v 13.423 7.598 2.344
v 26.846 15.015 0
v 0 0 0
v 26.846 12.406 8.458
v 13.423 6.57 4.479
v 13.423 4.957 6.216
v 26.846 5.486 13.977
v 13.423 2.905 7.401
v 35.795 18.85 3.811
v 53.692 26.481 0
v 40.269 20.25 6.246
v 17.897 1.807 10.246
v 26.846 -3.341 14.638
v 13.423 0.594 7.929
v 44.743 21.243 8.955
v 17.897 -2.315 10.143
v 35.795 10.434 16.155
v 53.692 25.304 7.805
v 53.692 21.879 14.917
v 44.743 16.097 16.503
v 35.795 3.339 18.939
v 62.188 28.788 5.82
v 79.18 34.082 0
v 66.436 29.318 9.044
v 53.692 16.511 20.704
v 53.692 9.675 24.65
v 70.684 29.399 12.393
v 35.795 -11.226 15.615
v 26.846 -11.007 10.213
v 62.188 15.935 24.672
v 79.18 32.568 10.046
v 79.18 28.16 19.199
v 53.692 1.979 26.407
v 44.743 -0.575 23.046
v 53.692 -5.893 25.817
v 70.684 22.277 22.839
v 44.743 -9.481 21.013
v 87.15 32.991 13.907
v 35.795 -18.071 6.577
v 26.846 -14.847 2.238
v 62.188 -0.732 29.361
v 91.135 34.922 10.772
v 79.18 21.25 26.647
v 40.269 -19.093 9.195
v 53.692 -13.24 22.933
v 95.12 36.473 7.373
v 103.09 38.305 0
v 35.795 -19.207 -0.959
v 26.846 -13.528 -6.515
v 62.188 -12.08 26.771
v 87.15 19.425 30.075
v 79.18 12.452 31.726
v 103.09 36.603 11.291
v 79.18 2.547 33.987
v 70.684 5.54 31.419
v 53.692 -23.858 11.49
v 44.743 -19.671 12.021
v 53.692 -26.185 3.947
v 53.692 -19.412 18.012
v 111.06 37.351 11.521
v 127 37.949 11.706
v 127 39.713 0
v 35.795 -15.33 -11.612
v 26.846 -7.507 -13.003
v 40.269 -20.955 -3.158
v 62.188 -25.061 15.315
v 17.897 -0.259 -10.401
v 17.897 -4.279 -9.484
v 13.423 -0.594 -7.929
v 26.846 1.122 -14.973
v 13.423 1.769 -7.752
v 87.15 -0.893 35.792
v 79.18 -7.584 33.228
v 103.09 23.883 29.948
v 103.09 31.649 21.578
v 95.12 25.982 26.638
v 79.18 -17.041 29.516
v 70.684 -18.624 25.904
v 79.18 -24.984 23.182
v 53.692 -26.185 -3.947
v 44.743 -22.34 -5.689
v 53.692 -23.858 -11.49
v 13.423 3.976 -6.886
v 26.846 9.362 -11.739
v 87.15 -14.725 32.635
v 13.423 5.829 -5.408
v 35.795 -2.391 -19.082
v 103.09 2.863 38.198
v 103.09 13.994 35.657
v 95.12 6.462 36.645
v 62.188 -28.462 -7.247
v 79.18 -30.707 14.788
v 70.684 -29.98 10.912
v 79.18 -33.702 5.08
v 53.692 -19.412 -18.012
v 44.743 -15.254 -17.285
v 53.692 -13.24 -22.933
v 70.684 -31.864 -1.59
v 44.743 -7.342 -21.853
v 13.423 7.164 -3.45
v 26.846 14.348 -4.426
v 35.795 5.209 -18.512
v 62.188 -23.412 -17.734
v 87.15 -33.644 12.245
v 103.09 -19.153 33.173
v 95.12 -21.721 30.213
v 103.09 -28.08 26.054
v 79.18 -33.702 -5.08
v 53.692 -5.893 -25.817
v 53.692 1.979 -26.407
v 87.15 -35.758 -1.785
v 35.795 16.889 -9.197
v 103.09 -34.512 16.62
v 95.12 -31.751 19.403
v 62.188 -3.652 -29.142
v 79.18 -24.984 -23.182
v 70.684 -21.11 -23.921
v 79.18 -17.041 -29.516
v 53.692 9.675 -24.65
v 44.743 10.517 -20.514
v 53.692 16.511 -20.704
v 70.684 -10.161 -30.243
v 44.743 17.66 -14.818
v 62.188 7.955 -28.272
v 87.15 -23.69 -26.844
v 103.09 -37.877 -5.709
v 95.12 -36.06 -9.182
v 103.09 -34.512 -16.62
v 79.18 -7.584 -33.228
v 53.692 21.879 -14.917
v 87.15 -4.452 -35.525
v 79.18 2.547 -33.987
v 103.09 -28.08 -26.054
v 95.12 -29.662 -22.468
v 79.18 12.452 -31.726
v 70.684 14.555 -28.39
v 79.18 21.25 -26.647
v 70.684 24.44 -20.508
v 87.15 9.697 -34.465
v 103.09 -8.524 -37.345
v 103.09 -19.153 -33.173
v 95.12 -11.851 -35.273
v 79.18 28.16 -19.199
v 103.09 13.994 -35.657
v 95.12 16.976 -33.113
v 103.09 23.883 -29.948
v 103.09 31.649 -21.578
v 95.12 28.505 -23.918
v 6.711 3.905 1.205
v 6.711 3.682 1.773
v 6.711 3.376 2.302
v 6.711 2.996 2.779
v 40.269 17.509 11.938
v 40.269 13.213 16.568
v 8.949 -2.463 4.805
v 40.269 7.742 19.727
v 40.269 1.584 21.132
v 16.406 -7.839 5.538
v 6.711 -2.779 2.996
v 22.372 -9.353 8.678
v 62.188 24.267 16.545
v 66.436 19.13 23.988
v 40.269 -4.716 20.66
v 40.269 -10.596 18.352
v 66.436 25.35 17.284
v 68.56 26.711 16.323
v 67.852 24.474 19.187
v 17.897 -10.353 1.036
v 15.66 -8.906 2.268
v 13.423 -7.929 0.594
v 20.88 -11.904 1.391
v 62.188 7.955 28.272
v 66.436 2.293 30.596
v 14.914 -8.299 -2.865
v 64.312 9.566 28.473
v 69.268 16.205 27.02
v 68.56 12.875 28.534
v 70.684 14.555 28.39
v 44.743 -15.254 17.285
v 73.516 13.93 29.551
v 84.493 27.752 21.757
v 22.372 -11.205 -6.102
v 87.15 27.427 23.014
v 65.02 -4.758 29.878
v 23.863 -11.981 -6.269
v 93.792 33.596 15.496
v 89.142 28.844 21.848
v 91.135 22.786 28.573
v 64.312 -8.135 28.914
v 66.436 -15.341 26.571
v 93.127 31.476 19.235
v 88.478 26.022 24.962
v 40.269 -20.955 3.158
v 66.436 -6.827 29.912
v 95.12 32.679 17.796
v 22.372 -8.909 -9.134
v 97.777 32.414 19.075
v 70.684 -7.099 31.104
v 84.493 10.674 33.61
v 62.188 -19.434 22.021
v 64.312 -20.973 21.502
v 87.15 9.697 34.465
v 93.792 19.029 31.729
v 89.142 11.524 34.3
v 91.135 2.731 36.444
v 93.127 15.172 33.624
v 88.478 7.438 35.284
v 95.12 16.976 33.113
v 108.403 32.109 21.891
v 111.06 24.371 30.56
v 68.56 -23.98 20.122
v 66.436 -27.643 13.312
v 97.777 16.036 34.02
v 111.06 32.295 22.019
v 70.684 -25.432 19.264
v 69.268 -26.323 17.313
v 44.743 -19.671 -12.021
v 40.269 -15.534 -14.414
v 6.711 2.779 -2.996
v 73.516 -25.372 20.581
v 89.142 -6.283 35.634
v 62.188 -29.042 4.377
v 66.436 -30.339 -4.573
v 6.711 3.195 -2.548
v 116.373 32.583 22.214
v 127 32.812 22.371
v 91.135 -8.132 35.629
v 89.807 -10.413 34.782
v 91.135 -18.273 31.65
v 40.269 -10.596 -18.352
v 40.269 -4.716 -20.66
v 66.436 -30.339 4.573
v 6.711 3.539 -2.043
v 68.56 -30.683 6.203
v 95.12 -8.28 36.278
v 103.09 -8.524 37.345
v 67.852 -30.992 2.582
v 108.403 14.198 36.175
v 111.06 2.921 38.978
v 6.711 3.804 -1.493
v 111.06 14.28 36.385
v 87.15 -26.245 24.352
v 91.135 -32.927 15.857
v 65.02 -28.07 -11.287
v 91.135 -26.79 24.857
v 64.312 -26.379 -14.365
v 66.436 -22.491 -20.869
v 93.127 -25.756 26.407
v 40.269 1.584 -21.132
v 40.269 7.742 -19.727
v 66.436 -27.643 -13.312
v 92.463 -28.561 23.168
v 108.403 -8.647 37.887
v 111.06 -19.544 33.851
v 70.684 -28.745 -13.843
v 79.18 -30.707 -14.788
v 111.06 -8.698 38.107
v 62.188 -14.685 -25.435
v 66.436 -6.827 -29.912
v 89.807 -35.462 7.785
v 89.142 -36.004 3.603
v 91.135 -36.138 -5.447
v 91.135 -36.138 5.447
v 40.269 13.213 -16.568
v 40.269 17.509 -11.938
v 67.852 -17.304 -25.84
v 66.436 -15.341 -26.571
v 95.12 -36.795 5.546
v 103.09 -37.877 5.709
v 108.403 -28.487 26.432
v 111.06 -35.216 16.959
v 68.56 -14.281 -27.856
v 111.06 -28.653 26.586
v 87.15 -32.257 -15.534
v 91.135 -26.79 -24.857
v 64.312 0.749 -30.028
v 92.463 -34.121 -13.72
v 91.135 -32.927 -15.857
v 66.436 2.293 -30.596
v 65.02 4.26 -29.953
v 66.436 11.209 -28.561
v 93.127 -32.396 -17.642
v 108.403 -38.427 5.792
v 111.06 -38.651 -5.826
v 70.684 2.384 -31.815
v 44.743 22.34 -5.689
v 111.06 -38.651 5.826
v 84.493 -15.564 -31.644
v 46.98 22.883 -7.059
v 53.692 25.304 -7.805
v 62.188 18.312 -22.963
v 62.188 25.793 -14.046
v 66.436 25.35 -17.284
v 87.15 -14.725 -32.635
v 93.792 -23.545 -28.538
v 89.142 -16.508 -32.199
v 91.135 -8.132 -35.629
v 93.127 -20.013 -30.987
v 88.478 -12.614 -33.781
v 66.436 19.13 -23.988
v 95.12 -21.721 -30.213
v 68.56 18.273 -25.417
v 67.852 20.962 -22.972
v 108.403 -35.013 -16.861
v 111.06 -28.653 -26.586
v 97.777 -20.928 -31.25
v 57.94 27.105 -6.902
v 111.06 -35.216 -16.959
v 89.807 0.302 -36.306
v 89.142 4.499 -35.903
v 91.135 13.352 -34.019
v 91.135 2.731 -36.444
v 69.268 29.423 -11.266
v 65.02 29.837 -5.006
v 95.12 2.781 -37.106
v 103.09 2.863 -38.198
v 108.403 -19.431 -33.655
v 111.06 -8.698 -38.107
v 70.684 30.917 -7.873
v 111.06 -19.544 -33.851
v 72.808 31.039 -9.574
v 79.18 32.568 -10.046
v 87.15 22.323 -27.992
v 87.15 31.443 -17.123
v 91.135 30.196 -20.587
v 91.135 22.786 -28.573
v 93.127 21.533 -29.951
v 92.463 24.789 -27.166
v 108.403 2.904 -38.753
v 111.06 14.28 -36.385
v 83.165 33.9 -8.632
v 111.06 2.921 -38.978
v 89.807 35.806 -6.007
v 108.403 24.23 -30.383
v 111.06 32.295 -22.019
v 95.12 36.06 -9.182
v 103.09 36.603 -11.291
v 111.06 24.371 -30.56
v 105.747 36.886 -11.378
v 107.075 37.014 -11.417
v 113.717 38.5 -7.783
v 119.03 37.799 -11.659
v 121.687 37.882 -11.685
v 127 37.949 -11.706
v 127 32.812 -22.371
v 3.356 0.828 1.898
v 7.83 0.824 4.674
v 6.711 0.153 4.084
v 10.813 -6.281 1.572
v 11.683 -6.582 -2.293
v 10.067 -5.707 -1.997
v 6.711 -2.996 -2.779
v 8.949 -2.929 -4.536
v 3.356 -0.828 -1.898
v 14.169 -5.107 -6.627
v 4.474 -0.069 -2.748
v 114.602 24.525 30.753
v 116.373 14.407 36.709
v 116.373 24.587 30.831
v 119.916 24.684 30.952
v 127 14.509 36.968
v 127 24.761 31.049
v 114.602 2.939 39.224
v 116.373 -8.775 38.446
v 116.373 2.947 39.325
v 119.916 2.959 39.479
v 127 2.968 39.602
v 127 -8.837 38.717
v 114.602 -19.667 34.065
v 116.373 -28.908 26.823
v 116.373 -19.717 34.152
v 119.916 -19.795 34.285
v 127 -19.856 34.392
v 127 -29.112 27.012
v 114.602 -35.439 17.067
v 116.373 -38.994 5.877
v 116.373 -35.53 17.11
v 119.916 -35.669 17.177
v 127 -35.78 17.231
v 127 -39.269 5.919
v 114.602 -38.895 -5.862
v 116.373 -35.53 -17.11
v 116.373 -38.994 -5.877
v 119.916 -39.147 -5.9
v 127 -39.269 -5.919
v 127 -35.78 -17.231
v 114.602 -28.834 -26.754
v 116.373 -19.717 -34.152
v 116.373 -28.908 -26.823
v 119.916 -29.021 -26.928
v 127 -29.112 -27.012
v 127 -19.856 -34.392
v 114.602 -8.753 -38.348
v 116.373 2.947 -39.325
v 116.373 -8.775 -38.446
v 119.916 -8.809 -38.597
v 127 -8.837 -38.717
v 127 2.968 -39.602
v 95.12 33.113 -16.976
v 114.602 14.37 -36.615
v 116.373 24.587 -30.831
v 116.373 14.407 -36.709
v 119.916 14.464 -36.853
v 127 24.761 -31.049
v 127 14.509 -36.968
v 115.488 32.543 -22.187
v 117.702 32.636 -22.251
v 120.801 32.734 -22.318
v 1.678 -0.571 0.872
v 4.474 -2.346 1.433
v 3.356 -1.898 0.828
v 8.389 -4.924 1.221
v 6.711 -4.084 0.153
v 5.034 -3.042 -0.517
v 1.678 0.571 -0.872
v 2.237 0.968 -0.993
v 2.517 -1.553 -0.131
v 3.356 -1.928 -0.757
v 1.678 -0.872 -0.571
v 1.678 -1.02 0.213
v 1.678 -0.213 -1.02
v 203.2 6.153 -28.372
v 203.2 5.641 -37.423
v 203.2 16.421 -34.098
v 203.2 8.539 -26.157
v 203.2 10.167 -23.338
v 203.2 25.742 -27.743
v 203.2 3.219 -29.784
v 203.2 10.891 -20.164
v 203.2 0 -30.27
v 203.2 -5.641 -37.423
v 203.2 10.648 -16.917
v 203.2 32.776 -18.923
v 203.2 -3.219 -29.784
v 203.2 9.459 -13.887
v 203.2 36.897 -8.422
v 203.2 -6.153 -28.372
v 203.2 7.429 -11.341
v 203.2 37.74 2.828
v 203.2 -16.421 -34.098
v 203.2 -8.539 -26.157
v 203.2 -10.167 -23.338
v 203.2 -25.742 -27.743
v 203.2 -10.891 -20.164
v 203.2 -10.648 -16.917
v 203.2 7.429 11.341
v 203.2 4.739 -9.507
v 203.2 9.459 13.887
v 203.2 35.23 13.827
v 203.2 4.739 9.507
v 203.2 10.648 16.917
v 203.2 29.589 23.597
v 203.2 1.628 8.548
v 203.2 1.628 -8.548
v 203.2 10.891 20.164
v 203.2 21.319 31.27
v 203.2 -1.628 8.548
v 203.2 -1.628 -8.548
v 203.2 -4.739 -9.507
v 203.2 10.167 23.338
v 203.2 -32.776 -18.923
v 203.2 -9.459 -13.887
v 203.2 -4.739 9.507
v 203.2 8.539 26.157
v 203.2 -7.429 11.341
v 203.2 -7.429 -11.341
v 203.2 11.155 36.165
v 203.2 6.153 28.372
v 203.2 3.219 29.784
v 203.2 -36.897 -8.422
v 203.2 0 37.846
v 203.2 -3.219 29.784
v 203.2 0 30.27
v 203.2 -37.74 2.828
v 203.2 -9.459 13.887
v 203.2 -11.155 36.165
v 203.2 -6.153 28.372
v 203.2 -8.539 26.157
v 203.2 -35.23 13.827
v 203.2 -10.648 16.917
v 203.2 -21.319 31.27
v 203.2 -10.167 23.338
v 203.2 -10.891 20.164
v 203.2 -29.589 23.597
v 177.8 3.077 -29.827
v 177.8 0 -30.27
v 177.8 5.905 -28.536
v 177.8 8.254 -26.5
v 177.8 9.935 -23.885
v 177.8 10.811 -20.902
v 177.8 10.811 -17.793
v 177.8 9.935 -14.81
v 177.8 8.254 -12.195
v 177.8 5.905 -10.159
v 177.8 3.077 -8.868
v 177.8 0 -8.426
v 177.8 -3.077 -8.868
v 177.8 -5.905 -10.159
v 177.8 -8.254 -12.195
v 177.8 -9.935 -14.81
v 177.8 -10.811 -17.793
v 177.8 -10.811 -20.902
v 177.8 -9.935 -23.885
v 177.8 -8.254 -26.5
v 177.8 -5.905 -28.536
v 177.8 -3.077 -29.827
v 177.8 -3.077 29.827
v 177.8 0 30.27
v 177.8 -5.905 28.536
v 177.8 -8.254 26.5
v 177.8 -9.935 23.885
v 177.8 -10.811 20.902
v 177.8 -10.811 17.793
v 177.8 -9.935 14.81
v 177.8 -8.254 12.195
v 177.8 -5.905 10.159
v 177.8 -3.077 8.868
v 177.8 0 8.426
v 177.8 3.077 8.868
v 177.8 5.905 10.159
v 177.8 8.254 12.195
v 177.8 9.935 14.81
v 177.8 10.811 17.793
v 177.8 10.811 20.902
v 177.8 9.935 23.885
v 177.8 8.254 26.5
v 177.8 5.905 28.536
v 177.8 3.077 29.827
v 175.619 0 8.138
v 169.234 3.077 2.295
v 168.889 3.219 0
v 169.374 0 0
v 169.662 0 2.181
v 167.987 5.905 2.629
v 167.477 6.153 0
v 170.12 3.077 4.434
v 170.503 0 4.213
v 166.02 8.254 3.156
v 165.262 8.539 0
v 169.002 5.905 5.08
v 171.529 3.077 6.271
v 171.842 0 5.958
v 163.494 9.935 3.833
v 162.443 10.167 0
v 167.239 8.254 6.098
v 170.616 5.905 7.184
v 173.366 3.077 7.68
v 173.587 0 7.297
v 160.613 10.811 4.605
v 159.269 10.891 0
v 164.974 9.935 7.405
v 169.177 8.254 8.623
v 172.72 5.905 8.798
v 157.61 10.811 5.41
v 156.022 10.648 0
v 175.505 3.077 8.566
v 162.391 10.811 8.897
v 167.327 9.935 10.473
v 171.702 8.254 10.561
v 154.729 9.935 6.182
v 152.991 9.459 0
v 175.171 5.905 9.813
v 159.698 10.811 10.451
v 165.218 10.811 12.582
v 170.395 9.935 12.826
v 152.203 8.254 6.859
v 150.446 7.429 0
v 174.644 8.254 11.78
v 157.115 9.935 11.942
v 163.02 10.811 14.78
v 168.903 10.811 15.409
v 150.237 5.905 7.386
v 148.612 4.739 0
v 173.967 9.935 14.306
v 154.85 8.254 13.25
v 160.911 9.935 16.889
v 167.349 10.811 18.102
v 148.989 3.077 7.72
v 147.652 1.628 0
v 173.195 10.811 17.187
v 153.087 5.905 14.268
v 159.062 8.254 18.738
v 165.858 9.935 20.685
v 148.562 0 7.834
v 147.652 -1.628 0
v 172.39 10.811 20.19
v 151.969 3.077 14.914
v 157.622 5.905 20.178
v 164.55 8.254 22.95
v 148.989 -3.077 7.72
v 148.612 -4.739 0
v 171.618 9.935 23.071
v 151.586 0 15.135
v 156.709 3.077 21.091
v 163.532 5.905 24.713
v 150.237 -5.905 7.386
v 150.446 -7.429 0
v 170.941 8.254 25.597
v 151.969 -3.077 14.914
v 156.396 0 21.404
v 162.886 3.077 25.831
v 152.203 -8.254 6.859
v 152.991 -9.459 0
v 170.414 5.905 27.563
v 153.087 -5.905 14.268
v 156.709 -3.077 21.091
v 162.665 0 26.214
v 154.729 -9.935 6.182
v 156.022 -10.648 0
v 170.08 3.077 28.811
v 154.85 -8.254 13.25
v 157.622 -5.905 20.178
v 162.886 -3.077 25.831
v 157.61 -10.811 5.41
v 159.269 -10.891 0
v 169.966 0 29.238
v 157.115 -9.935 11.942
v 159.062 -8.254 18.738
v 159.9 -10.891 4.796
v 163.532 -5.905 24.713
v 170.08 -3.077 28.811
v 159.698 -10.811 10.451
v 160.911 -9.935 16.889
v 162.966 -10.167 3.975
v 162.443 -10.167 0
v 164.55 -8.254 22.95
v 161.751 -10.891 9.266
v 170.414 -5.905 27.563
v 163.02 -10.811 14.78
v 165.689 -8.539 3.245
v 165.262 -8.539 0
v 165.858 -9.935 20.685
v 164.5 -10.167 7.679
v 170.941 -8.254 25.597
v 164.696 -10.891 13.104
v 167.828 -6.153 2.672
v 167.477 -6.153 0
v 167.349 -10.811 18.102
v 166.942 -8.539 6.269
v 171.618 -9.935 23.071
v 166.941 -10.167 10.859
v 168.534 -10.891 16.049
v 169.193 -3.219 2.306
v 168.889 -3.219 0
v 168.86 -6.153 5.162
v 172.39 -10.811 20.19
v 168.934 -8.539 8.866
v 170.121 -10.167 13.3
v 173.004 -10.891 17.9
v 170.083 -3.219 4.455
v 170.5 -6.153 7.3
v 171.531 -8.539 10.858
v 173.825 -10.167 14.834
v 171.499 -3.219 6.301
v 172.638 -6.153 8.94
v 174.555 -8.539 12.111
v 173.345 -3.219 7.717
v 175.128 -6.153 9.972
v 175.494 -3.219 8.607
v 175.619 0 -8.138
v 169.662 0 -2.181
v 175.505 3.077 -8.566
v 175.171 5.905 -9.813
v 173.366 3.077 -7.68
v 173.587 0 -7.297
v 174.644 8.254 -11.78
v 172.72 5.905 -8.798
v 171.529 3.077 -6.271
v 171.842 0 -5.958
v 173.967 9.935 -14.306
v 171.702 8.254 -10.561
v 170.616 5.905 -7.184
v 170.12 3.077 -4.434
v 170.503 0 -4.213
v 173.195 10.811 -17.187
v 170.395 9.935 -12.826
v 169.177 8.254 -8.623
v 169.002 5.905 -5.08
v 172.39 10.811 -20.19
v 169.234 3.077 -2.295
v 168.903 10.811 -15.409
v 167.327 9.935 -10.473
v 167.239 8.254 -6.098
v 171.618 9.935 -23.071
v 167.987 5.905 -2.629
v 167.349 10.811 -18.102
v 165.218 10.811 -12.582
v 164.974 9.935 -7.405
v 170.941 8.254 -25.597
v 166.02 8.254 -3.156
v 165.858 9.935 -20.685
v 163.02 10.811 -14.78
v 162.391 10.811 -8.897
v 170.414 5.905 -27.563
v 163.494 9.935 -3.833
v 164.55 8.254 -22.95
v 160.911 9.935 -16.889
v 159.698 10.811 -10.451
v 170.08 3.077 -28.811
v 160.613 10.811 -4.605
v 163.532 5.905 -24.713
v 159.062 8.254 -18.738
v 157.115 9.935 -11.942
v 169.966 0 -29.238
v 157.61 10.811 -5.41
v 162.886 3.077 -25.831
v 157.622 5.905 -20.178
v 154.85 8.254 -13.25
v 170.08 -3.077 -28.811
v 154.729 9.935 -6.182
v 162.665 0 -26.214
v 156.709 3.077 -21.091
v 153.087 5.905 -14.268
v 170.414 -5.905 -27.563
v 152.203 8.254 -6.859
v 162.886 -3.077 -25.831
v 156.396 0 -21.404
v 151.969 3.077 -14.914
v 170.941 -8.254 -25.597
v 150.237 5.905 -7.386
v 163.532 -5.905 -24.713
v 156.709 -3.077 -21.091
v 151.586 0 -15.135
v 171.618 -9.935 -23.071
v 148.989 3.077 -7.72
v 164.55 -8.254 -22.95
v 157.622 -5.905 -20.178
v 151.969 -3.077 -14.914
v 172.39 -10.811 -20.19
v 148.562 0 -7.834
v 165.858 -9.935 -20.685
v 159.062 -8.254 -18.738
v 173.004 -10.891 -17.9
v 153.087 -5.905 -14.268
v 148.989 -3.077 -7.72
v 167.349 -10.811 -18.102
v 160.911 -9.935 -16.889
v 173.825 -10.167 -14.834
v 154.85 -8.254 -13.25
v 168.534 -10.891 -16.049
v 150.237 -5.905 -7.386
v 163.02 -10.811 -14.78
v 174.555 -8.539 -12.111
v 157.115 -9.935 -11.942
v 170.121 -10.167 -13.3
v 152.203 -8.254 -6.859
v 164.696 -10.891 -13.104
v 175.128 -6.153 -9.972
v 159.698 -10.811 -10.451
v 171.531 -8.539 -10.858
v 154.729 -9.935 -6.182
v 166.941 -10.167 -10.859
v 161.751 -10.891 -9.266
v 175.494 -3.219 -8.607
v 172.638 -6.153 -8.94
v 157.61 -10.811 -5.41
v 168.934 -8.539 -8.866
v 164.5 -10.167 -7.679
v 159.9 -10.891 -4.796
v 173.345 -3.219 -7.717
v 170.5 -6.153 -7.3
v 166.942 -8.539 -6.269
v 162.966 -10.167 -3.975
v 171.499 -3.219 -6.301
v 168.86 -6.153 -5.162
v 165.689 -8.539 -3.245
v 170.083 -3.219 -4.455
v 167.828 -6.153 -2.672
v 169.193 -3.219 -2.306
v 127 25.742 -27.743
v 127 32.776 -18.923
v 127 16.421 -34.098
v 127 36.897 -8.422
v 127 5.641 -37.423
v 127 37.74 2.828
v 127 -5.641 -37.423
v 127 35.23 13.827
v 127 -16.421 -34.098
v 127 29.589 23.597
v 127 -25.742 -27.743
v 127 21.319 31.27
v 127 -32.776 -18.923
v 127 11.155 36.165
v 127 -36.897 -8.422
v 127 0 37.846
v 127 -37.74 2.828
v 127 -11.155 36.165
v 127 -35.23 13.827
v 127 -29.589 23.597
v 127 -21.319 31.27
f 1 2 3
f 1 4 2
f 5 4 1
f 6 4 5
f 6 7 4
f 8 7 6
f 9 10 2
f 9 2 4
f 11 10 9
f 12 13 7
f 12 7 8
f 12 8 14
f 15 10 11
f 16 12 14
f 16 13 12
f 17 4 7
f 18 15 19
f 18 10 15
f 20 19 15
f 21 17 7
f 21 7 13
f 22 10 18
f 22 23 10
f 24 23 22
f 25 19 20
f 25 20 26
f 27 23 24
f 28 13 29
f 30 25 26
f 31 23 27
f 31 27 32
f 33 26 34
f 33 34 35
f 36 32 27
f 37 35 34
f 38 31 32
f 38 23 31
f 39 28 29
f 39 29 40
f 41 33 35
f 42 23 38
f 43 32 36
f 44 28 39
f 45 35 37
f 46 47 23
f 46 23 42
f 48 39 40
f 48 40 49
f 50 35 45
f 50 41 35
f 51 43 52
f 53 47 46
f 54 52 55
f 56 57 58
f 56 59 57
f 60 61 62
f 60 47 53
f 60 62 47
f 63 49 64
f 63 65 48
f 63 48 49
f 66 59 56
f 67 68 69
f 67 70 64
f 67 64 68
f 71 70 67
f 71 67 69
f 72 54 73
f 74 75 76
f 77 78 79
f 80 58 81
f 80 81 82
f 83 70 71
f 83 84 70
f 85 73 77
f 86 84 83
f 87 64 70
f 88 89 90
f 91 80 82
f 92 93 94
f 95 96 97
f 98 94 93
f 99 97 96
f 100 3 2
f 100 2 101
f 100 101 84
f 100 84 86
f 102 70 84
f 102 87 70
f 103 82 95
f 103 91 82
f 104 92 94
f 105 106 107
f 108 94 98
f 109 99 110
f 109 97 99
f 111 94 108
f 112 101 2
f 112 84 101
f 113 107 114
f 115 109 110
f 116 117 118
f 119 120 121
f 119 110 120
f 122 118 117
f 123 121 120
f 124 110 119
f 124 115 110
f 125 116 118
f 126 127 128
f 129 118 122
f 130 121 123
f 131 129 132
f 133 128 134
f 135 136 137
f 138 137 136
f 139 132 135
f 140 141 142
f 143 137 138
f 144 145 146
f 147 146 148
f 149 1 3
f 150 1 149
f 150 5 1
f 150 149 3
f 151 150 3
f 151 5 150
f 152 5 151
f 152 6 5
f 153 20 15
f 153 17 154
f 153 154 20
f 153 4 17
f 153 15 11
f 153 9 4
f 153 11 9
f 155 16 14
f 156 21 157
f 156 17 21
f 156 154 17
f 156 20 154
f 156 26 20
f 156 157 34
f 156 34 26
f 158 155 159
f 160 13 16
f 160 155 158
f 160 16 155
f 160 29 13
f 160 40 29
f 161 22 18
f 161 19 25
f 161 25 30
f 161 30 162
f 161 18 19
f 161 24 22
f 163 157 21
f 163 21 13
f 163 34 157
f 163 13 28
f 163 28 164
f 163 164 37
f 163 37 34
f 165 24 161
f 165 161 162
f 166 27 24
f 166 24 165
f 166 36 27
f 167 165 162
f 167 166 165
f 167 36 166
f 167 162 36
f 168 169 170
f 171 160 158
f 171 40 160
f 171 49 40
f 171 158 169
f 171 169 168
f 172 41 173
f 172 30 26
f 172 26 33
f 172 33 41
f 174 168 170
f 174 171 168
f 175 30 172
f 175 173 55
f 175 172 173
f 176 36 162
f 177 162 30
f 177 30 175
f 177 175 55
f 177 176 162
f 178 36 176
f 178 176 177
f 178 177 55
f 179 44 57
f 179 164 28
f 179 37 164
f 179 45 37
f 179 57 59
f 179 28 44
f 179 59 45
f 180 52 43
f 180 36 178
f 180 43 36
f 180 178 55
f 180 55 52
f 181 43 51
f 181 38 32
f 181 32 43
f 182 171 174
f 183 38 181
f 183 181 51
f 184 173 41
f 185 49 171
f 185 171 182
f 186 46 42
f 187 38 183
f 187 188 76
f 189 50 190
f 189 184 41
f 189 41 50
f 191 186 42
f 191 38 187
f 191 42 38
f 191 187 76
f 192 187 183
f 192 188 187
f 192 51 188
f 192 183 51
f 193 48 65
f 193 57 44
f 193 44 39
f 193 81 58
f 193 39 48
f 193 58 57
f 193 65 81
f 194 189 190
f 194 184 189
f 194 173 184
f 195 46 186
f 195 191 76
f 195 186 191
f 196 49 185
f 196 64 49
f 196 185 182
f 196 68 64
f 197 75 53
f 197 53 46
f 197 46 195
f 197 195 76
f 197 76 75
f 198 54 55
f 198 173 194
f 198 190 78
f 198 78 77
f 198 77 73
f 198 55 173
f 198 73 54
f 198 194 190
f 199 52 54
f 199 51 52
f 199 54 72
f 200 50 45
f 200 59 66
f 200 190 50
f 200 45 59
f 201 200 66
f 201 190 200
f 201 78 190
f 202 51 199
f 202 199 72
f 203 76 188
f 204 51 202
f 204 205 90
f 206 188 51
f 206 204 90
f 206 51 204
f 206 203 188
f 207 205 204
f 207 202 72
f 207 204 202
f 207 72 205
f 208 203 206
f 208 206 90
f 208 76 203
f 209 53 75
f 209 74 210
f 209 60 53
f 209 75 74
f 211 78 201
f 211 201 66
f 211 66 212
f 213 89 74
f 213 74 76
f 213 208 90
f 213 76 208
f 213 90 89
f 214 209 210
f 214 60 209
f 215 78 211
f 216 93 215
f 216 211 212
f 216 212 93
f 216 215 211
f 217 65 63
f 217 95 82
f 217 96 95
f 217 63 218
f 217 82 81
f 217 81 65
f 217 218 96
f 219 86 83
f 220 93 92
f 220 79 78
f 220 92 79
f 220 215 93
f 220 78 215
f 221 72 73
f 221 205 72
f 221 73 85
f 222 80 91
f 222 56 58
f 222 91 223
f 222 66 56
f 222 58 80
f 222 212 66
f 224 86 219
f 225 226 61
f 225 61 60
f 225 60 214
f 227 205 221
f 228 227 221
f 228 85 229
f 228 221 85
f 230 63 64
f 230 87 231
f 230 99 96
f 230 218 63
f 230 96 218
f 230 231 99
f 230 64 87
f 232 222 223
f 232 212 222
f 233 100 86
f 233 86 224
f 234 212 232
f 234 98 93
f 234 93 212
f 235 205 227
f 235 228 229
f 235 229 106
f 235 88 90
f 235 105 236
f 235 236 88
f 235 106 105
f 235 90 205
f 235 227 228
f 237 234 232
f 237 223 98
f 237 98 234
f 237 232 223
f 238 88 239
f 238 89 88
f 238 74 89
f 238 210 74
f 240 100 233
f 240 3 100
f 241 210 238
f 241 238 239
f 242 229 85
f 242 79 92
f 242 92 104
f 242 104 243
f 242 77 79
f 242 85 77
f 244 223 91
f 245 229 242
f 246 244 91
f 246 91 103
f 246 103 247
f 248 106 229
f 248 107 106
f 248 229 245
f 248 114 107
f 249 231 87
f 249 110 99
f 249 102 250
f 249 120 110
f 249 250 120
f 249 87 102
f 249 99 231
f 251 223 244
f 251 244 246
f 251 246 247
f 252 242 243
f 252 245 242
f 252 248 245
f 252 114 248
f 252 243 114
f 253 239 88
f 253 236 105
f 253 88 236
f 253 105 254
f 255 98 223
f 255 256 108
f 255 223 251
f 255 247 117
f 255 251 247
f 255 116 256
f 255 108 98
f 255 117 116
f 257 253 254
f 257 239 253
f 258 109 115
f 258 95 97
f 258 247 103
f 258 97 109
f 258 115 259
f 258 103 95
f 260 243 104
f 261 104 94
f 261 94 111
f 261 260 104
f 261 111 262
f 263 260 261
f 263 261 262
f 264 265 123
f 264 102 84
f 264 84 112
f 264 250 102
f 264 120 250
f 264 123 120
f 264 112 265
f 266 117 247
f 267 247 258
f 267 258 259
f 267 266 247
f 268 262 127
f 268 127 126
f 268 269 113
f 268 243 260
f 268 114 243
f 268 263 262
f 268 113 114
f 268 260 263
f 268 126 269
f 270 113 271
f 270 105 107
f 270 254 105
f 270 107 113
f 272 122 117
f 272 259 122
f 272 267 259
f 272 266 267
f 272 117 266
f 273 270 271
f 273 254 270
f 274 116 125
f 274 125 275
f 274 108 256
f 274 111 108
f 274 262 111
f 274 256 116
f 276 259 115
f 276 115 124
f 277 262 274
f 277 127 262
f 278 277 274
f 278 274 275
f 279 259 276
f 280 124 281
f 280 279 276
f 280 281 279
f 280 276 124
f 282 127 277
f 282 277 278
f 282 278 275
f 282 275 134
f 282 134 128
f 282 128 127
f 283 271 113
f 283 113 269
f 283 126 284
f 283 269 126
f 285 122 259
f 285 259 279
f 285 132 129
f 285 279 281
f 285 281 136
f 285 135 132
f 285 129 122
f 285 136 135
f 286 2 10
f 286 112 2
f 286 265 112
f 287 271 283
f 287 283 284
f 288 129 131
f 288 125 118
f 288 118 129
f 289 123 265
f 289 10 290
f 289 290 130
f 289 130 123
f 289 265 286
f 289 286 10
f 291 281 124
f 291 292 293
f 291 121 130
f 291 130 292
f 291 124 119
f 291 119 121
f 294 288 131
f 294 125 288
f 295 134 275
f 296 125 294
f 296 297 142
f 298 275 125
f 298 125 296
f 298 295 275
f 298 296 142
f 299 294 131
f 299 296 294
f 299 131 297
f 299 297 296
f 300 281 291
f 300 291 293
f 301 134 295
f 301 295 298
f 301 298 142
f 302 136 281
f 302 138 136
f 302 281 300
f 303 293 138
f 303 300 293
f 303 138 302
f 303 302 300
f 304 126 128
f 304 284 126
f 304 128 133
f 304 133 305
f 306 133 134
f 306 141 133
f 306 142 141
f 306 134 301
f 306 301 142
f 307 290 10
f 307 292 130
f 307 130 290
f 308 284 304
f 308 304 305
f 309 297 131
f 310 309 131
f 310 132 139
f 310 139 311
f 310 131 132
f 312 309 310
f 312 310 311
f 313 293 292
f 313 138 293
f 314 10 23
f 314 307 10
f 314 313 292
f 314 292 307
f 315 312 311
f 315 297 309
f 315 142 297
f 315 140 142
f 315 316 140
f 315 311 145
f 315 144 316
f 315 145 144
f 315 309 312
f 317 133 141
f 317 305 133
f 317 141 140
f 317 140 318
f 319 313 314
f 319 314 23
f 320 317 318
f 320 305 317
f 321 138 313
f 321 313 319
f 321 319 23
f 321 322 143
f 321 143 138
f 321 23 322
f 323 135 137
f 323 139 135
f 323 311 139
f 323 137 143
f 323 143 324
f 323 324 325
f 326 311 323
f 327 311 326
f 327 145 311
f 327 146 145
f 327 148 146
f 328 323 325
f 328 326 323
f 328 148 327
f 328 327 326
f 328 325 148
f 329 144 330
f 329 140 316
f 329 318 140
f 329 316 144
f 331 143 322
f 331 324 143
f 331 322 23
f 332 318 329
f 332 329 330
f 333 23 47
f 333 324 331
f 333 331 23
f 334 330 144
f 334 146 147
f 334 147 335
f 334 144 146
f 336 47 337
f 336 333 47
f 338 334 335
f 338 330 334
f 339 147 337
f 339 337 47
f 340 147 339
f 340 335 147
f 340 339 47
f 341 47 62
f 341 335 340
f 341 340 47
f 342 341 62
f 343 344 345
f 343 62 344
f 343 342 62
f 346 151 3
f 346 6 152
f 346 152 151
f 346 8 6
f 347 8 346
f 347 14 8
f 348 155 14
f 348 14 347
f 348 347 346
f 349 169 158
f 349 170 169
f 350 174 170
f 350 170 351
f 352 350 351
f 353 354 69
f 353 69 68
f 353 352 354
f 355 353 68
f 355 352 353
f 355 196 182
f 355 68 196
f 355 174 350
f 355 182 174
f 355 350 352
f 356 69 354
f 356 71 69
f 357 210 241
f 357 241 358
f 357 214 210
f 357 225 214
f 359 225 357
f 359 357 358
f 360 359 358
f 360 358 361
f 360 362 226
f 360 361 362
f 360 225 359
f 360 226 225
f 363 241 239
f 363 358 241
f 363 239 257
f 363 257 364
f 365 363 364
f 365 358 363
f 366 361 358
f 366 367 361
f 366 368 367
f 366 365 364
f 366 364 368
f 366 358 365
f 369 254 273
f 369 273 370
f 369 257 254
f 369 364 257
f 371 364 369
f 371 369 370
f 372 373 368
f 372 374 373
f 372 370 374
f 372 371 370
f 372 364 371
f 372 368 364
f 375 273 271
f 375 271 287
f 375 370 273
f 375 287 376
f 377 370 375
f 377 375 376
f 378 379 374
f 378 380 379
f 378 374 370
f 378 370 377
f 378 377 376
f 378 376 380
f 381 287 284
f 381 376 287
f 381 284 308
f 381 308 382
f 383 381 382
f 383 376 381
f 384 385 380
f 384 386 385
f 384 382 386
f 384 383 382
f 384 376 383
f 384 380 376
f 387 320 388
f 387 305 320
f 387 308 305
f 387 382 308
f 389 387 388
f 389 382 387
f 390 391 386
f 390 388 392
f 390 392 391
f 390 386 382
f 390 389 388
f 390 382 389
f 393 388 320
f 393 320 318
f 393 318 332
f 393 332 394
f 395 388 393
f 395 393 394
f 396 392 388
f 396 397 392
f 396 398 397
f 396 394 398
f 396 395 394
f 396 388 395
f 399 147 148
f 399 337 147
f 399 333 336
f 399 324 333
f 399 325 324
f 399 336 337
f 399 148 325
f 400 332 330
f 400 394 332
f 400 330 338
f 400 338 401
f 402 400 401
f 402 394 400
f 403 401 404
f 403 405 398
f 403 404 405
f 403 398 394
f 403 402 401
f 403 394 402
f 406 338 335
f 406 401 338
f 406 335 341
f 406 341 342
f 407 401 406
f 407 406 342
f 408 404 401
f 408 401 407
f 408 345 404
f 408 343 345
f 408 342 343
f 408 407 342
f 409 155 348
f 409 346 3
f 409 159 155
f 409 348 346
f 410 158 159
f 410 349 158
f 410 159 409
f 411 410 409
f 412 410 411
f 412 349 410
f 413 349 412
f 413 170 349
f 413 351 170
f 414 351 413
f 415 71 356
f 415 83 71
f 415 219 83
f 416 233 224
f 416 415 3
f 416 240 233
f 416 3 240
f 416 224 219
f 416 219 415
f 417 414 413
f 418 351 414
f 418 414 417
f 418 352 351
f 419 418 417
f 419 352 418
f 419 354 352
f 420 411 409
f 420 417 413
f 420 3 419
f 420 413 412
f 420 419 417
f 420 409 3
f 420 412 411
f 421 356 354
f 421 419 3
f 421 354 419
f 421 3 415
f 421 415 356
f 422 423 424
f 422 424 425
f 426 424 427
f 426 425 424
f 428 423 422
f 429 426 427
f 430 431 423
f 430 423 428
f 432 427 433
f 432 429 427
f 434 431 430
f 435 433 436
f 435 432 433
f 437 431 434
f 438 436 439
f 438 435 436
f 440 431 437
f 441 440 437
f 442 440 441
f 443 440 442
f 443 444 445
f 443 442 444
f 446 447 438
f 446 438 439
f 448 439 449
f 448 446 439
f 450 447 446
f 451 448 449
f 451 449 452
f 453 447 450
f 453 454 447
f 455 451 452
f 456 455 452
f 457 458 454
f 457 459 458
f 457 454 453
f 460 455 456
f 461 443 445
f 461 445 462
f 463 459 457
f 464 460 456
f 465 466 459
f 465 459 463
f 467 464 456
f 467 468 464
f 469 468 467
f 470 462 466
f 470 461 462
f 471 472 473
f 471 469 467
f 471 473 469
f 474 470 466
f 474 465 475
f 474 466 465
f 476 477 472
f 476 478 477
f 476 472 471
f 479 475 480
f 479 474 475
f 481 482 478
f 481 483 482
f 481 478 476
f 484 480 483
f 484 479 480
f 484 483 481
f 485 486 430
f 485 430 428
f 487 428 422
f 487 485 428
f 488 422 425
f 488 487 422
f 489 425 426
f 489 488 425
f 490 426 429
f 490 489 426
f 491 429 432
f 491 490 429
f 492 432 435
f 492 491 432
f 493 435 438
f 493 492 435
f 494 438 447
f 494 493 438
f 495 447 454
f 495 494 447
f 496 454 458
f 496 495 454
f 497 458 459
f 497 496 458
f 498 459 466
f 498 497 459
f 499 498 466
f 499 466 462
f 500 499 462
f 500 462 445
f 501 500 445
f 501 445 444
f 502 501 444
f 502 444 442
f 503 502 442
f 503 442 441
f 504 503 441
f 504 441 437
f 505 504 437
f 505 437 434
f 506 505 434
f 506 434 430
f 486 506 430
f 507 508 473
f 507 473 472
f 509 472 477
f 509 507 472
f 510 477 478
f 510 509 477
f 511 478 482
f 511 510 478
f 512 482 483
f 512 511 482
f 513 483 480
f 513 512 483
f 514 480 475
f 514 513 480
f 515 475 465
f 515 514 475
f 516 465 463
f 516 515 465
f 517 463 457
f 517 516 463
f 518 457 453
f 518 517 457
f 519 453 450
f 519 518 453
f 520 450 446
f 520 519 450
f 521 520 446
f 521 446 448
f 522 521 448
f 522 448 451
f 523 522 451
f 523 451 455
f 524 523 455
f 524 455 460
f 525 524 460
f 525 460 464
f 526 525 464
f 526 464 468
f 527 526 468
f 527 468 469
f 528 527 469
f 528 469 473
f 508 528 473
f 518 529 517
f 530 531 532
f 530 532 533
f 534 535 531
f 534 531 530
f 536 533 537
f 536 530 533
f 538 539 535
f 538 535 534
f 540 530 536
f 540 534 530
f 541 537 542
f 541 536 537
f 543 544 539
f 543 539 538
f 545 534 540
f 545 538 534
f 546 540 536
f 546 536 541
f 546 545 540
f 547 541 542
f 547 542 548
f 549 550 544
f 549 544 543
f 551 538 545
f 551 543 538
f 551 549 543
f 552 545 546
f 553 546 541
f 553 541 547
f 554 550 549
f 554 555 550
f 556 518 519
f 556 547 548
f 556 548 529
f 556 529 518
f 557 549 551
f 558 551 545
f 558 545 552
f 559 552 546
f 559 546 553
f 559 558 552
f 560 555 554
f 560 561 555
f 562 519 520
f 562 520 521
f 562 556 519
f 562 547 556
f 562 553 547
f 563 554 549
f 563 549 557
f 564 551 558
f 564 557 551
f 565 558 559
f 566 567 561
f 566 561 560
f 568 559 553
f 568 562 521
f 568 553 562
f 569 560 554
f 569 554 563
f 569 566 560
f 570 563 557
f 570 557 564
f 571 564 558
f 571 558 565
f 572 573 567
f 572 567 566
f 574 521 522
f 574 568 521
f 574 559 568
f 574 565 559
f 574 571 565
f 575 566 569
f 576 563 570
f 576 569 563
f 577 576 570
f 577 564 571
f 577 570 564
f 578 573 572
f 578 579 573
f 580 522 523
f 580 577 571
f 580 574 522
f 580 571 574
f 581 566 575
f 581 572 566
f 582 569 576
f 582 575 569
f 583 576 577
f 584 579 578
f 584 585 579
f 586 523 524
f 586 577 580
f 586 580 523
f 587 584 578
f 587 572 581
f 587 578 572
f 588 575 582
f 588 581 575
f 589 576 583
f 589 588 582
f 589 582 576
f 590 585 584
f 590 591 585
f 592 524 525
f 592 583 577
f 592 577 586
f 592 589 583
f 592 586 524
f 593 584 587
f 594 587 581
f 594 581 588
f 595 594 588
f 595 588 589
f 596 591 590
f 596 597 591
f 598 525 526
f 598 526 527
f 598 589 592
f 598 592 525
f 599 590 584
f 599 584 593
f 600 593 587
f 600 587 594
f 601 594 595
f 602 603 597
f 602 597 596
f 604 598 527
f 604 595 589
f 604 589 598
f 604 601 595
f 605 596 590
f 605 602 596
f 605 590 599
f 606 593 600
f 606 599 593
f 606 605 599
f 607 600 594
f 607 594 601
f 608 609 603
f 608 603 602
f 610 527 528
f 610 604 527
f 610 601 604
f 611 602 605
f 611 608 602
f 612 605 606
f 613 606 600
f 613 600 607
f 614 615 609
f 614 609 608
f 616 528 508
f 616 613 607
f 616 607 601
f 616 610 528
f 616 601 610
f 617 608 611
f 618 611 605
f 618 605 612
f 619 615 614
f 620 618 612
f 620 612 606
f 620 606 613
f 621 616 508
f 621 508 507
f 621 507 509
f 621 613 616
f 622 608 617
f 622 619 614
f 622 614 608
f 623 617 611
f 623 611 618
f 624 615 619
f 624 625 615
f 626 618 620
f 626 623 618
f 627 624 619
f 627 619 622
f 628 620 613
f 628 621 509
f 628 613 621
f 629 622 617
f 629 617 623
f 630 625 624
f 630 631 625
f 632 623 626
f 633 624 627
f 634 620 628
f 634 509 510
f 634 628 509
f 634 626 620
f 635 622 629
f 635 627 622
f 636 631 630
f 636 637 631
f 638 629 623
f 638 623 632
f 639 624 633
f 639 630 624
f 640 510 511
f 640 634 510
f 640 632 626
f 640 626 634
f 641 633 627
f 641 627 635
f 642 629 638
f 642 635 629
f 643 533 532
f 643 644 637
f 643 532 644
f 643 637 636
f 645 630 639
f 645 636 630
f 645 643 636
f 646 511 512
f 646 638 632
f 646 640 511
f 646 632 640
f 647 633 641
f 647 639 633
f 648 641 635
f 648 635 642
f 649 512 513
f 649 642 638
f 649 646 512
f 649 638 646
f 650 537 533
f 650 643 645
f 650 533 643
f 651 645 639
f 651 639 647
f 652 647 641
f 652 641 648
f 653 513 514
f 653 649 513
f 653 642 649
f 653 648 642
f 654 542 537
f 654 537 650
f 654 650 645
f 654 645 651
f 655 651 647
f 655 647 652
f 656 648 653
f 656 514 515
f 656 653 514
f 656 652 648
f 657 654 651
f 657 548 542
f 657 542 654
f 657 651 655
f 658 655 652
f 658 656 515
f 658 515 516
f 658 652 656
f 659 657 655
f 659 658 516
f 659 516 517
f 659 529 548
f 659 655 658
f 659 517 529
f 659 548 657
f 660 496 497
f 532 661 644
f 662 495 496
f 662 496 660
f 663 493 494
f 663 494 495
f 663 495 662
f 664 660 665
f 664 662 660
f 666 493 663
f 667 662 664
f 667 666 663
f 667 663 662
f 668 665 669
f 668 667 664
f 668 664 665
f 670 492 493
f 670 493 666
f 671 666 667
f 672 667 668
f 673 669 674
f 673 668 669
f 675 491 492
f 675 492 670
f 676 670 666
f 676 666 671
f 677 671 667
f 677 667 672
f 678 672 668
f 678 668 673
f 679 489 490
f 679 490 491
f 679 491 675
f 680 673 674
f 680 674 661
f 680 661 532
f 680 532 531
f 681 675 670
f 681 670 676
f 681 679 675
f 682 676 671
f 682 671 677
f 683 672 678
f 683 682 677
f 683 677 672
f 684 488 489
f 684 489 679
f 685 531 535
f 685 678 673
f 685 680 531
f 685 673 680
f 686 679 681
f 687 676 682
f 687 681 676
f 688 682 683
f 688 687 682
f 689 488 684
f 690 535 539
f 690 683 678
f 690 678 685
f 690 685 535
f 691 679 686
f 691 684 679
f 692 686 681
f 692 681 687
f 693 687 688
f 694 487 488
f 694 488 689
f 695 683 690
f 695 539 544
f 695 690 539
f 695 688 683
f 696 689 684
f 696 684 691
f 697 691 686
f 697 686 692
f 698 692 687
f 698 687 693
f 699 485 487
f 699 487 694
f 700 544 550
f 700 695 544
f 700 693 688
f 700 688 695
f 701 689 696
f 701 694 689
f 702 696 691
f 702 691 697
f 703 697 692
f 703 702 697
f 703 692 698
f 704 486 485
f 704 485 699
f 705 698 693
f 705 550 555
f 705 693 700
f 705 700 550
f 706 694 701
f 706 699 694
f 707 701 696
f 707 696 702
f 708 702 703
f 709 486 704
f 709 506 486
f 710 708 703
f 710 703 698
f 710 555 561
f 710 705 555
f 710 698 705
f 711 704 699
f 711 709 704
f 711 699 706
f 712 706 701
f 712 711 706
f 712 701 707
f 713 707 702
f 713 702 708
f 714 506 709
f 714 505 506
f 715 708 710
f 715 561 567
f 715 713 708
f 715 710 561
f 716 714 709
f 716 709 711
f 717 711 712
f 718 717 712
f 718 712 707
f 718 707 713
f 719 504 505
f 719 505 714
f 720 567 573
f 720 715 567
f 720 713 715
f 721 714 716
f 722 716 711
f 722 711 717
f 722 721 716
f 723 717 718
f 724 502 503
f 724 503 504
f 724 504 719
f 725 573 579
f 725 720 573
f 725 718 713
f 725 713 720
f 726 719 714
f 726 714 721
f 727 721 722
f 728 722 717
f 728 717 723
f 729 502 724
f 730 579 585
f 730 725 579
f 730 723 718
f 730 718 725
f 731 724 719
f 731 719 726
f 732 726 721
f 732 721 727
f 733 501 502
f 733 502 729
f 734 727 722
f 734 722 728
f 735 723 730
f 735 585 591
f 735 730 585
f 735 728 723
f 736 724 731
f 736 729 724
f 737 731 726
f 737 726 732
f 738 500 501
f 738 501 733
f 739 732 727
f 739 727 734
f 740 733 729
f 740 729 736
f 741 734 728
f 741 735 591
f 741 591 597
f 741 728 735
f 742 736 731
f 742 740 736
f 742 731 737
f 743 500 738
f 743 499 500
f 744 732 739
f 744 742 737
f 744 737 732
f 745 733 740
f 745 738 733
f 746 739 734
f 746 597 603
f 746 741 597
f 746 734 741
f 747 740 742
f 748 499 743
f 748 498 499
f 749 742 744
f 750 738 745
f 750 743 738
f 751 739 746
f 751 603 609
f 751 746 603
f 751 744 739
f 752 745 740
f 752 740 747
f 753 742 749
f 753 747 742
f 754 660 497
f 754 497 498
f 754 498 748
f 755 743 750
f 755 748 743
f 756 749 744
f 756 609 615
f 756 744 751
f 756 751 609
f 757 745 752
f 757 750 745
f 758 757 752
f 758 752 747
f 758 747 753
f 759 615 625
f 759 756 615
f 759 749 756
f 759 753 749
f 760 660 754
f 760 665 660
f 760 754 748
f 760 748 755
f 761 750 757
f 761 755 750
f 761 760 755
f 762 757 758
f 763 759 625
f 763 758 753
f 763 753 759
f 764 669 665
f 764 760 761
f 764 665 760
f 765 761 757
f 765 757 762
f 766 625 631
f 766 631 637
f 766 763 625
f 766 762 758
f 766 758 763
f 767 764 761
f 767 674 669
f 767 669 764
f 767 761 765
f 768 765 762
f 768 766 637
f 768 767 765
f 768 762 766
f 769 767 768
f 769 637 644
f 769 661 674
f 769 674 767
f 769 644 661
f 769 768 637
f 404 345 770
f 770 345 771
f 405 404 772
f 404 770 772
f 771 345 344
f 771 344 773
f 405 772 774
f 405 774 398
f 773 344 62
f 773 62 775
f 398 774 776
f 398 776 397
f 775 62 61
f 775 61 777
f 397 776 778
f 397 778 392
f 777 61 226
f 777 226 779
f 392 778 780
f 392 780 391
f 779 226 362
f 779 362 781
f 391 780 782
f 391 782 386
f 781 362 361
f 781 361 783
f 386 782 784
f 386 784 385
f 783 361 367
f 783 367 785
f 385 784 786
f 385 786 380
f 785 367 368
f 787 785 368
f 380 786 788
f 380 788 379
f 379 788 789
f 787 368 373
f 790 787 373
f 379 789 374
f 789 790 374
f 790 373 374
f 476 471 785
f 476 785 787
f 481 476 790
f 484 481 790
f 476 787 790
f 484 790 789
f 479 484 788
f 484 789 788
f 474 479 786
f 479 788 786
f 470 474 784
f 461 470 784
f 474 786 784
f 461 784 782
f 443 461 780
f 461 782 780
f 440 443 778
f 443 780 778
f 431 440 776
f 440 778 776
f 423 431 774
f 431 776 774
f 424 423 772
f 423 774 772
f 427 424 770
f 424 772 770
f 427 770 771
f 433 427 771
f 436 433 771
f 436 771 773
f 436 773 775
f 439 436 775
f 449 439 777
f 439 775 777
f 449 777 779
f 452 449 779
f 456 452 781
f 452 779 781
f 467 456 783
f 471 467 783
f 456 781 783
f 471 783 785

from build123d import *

# Parameters (mm, degrees)
SKETCH2_R           = 37.846
BOSS_EXTRUDE1_DEPTH = 50.8
SKETCH3_R           = 10.922
SKETCH4_R           = 37.846
SKETCH4_R_2         = 10.922
BOSS_EXTRUDE2_DEPTH = 25.4


with BuildPart() as part:
    # Sketch1 → Revolve1 (revolve)
    with BuildSketch(Plane.XY):
        with BuildLine():
            Line((126.999999998, 0), (126.999999998, 39.712900001))
            add(Edge.make_bspline(
                [(-1e-09, 0), (63.499999999, 39.7129), (126.999999998, 39.712900001)],
                knots=[0.074879484, 0.074879484, 0.074879484, 0.915898135, 0.915898135, 0.915898135], degree=2))
            Line((-1e-09, 0), (126.999999998, 0))
        make_face()
    revolve(axis=Axis((-1e-09, 0, 0), (1, 0, 0)))

    # Sketch2 → Boss-Extrude1 (add)
    with BuildSketch(Plane(origin=(126.999999998, 0, 0), x_dir=(0, 0, -1), z_dir=(1, 0, 0))):
        Circle(SKETCH2_R)
    extrude(amount=BOSS_EXTRUDE1_DEPTH)

    # Sketch3 → Cut-Revolve1 (revolve, cut)
    with BuildSketch(Plane(origin=(177.799999998, 0, 0), x_dir=(0, 0, -1), z_dir=(1, 0, 0))):
        with Locations((-19.347570256, 0)):
            Circle(SKETCH3_R)
    revolve(axis=Axis((177.799999998, 0, 0), (0, 1, 0)), mode=Mode.SUBTRACT)

    # Sketch4 → Boss-Extrude2 (add)
    with BuildSketch(Plane(origin=(177.799999998, 0, 0), x_dir=(0, 0, -1), z_dir=(1, 0, 0))):
        Circle(SKETCH4_R)
        with Locations((-19.347570256, 0)):
            Circle(SKETCH4_R_2, mode=Mode.SUBTRACT)
        with Locations((19.347570256, 0)):
            Circle(SKETCH4_R_2, mode=Mode.SUBTRACT)
    extrude(amount=BOSS_EXTRUDE2_DEPTH)


solid = part.part
